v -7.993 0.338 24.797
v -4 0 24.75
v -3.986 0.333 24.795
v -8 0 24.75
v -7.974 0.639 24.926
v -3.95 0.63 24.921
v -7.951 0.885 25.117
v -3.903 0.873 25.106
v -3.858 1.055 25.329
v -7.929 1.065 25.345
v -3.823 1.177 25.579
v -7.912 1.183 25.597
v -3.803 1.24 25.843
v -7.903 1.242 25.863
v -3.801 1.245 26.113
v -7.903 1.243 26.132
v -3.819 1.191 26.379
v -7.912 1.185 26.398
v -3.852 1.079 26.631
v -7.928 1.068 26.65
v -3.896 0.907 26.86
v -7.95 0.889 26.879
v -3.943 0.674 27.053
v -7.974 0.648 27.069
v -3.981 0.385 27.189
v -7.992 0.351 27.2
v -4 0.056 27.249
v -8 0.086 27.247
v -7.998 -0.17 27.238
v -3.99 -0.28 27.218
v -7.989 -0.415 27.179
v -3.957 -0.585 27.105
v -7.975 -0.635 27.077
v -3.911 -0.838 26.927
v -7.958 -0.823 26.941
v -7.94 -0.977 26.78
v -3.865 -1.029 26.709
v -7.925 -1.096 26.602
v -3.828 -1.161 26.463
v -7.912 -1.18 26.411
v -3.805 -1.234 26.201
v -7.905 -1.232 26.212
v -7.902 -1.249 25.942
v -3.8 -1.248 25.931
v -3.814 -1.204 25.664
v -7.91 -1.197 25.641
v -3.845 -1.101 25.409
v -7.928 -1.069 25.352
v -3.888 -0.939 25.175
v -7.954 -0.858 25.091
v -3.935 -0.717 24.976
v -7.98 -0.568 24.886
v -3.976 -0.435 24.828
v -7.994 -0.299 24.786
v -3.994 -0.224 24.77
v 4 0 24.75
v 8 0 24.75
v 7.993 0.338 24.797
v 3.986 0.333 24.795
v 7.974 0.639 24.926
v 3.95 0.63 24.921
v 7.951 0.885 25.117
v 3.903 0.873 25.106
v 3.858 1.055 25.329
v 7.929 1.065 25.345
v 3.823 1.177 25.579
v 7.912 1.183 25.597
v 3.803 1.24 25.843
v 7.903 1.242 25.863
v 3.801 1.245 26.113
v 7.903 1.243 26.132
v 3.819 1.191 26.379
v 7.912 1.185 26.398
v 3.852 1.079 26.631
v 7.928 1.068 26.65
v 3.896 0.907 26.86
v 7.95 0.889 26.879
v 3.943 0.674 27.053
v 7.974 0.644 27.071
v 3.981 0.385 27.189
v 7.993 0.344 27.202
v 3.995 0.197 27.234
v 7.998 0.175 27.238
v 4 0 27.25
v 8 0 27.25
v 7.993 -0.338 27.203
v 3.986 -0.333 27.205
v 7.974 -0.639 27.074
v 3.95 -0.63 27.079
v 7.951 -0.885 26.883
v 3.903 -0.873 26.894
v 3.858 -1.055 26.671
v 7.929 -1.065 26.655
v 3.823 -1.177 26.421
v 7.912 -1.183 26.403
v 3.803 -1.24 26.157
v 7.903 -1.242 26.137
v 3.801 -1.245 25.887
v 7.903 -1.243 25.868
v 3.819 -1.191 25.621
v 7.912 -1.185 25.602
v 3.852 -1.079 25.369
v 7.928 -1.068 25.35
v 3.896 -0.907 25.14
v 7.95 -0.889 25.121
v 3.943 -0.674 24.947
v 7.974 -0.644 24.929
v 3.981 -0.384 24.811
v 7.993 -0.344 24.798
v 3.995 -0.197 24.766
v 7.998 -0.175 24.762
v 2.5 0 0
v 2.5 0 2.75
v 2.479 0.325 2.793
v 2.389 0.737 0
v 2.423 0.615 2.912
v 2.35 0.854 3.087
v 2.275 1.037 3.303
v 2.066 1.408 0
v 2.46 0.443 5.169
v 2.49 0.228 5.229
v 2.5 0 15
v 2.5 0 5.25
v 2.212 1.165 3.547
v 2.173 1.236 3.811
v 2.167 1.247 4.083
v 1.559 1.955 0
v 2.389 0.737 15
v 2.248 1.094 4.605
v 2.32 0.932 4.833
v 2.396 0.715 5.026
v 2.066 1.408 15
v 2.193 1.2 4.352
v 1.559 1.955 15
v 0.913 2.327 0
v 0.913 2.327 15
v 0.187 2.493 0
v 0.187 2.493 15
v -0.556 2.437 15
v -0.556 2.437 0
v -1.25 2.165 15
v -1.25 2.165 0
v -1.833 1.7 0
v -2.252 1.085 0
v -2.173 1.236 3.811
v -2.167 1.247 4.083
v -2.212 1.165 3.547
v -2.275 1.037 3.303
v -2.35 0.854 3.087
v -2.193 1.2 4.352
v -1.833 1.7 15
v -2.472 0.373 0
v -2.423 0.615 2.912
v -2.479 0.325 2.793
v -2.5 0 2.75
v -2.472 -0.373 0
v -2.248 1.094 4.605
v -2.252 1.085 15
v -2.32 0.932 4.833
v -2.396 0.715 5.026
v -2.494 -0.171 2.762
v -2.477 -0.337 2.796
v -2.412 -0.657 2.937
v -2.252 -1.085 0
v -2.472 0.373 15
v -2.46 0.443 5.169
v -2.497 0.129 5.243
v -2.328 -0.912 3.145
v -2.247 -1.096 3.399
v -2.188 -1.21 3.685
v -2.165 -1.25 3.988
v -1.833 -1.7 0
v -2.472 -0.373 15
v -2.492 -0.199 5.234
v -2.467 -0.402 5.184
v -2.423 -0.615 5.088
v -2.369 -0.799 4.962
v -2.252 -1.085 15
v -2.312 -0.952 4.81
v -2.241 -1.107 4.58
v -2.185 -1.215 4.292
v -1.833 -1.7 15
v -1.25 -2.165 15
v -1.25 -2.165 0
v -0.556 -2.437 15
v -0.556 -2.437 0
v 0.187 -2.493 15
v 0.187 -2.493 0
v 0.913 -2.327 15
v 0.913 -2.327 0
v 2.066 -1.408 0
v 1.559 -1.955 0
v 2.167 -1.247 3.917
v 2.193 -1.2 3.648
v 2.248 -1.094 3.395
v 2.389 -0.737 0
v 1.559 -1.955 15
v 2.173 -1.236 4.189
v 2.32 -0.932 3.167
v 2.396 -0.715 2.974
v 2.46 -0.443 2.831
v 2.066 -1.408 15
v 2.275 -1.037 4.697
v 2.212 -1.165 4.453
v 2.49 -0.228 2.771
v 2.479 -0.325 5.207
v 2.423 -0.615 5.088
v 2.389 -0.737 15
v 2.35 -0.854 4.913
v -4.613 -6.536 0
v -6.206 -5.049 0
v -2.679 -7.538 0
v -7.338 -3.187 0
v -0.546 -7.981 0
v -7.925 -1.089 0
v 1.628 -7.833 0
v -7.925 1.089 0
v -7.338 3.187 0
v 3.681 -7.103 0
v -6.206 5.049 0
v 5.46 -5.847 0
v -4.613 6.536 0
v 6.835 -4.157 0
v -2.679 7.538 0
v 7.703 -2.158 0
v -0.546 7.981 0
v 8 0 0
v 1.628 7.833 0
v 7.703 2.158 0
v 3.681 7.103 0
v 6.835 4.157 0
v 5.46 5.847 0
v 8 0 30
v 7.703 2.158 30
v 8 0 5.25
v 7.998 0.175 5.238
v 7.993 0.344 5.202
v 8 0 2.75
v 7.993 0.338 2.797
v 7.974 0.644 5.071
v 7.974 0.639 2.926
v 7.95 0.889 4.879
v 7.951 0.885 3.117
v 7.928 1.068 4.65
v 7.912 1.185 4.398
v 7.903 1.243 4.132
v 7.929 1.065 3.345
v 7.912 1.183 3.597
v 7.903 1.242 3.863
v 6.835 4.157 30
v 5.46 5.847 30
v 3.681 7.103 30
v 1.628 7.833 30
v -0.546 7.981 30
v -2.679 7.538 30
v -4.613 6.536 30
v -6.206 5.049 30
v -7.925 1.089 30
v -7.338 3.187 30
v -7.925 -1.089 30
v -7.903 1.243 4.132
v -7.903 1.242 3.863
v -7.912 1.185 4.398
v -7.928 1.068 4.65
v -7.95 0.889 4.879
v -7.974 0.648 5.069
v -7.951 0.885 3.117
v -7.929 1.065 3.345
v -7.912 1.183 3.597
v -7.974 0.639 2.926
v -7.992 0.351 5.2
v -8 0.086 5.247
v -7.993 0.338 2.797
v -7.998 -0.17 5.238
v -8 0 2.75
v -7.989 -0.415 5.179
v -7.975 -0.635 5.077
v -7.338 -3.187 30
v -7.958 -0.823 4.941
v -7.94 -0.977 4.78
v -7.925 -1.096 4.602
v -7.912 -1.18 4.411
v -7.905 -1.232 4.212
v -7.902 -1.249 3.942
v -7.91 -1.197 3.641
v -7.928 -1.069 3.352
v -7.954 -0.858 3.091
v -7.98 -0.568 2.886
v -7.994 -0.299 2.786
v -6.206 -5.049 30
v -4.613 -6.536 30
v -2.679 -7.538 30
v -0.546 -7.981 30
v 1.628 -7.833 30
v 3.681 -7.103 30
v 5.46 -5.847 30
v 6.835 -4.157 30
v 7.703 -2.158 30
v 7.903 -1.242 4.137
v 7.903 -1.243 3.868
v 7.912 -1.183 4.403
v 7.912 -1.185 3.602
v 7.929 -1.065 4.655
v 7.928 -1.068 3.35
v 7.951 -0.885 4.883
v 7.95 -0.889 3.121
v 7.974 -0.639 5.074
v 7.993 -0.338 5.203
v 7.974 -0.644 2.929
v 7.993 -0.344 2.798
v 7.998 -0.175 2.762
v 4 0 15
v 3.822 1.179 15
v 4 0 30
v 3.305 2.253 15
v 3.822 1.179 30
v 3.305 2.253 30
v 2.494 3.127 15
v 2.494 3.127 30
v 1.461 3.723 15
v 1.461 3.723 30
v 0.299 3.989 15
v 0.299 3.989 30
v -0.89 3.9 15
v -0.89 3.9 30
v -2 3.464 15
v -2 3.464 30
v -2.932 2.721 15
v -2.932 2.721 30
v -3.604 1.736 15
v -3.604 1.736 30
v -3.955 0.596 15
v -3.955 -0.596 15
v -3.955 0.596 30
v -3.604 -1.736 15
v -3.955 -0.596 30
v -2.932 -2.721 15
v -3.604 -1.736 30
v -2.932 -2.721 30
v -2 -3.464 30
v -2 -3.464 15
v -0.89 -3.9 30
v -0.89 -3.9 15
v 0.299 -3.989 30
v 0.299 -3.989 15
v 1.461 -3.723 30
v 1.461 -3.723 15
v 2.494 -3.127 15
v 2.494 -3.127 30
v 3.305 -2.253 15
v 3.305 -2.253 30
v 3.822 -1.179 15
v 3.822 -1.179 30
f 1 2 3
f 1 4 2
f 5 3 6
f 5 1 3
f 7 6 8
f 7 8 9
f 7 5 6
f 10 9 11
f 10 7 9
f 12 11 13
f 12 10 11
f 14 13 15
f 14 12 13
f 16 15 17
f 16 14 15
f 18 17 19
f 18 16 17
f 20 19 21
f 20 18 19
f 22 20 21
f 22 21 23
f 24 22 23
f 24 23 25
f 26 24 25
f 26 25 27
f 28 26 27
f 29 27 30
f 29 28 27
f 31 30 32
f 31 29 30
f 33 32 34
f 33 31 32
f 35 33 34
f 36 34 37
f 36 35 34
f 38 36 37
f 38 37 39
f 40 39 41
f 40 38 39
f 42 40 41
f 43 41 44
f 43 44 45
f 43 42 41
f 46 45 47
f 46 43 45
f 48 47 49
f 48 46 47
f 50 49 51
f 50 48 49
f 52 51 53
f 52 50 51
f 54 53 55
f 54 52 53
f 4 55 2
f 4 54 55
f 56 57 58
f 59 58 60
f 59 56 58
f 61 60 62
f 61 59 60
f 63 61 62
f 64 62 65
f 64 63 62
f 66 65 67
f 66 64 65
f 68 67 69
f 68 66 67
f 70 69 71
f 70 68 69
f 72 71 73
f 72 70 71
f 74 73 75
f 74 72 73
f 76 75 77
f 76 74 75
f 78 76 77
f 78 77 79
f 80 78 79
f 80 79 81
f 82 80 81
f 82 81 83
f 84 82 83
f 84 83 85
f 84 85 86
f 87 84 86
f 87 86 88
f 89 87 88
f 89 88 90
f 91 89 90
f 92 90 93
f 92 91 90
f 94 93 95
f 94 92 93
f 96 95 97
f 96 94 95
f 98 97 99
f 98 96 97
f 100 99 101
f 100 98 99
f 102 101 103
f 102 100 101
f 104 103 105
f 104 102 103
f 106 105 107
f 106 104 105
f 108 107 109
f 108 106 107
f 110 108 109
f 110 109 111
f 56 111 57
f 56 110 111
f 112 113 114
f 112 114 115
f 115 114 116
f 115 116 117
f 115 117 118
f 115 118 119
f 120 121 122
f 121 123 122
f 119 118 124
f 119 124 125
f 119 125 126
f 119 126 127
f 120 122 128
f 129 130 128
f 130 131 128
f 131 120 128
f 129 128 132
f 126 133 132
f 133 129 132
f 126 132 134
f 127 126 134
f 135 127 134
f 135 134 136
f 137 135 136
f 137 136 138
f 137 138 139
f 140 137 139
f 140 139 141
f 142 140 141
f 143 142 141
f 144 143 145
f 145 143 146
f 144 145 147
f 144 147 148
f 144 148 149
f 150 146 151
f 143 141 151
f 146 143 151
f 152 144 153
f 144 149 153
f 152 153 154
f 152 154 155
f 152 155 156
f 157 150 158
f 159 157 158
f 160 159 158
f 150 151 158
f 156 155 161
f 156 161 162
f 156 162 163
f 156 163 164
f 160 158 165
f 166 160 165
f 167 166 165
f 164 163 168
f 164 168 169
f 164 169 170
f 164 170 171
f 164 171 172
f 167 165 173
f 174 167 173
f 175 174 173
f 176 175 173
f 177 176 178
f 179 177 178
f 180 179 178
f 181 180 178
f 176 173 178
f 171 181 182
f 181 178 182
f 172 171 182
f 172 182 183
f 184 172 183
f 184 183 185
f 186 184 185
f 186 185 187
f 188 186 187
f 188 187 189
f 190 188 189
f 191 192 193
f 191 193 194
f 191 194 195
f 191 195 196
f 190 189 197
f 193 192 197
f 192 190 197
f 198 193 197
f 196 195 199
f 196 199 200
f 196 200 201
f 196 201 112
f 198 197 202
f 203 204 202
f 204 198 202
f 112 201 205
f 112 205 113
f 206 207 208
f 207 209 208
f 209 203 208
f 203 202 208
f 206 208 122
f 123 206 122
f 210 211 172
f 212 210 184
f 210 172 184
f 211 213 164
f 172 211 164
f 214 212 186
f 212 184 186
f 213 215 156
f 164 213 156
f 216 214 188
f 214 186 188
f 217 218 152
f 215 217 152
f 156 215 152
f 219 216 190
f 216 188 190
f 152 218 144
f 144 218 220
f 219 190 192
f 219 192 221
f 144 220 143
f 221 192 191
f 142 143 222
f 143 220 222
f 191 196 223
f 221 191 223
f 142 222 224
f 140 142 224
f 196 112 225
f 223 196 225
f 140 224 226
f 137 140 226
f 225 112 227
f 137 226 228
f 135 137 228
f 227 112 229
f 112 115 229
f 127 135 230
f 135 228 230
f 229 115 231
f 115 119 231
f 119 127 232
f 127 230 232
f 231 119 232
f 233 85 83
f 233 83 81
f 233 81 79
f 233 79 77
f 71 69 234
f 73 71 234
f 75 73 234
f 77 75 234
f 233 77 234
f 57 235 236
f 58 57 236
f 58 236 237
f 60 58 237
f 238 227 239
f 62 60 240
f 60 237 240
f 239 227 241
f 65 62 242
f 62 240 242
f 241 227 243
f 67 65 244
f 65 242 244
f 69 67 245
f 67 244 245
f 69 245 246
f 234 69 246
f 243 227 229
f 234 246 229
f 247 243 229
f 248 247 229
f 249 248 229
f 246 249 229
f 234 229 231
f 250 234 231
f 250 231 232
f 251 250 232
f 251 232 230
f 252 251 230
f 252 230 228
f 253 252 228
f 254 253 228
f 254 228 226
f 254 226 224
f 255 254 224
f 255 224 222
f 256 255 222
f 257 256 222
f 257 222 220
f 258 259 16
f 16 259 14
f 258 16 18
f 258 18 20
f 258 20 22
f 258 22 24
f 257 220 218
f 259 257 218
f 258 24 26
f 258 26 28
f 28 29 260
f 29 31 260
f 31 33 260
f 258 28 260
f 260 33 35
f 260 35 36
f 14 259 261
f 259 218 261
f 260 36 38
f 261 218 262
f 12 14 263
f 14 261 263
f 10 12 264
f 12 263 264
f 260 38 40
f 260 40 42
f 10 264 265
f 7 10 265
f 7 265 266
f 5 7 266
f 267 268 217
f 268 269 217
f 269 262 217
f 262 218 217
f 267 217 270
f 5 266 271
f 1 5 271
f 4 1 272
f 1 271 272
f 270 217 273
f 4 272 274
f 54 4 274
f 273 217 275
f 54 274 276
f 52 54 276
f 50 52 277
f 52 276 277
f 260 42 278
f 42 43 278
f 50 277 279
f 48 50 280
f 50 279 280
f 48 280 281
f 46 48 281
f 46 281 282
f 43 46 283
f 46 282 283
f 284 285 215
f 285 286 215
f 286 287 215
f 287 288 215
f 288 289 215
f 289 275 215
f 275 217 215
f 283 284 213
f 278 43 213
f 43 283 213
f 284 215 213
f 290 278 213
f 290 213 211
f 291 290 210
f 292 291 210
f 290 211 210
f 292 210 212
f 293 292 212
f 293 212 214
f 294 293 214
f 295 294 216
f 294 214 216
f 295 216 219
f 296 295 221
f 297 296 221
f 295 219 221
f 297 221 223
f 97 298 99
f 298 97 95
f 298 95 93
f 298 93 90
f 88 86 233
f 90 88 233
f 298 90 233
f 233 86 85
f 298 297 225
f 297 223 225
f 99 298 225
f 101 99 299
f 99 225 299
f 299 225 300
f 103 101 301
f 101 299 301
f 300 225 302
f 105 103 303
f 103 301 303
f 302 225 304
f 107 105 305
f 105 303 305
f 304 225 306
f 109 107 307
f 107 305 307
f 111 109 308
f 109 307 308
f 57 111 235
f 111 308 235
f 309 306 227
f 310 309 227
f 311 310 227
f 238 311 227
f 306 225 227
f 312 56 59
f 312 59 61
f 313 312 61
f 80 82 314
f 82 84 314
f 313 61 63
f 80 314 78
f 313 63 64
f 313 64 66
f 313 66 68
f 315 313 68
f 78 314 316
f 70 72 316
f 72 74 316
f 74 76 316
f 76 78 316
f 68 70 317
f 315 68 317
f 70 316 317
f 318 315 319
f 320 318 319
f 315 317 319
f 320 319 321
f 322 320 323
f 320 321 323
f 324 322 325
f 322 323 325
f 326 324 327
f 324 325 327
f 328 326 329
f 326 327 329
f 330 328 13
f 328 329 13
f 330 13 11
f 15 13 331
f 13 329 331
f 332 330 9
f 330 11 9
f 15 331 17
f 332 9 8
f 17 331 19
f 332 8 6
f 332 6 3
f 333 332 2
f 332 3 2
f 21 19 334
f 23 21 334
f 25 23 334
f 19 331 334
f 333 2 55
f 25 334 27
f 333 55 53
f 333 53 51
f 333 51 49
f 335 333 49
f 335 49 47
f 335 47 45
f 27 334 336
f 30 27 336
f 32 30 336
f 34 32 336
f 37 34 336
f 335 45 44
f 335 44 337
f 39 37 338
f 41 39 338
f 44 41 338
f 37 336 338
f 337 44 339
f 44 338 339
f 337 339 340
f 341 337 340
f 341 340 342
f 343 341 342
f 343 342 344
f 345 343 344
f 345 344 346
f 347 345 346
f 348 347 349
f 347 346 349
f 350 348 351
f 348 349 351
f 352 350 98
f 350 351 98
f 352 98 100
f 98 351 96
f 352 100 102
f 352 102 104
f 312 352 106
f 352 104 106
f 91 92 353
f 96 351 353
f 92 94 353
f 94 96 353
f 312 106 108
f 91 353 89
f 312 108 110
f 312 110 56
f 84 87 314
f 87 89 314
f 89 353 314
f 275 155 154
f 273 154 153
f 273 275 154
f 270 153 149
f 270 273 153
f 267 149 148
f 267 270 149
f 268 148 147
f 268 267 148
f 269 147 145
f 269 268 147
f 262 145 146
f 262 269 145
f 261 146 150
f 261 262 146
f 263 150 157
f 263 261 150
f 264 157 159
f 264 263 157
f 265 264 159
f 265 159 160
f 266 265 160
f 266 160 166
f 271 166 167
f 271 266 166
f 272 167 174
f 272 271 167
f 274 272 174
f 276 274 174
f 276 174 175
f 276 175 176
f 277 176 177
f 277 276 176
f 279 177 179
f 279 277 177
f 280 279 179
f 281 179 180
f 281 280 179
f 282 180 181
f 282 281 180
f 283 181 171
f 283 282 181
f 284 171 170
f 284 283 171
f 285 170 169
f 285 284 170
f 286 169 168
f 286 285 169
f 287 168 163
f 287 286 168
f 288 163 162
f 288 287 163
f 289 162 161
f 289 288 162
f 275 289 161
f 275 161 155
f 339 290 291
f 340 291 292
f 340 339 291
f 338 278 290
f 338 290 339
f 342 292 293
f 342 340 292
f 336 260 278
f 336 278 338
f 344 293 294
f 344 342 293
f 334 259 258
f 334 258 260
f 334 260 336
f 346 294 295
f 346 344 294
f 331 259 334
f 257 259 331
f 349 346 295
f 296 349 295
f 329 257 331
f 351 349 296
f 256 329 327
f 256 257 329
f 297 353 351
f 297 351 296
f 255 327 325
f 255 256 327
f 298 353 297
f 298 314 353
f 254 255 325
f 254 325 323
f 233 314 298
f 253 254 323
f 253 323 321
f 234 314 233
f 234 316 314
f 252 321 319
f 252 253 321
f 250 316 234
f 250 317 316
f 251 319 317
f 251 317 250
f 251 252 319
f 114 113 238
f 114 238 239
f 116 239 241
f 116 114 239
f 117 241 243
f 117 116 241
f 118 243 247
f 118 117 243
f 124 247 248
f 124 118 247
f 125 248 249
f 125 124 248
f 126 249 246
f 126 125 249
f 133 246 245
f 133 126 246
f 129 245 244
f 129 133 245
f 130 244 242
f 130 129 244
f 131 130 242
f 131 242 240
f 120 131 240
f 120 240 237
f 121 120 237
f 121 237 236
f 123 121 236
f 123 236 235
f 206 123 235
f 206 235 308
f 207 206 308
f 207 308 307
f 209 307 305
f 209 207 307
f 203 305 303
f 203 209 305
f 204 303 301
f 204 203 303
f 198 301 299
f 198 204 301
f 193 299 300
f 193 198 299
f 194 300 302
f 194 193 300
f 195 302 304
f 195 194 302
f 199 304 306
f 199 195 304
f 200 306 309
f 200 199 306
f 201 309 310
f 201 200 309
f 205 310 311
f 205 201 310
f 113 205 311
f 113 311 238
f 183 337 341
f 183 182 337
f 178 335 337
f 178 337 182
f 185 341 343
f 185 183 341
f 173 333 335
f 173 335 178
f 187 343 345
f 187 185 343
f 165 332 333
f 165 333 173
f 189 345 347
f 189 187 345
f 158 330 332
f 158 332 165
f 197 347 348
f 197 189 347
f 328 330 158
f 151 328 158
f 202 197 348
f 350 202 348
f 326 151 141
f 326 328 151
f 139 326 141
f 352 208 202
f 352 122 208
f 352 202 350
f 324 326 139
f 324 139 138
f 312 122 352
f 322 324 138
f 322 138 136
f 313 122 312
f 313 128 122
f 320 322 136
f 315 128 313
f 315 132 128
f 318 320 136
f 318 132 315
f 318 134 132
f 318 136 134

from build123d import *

# Parameters (mm, degrees)
SCHIZZO1_R                    = 8
ESTRUSIONE_ESTRUSIONE1_DEPTH  = 30
SCHIZZO2_R                    = 2.5
TAGLIO_ESTRUSIONE1_DEPTH      = 33.062439084
SCHIZZO3_R                    = 4
TAGLIO_ESTRUSIONE2_DEPTH      = 15
TAGLIO_ESTRUSIONE3_DEPTH      = 33.062439084
TAGLIO_ESTRUSIONE3_DEPTH_BACK = 33.062439084
SCHIZZO4_R                    = 1.25


with BuildPart() as part:
    # Schizzo1 → Estrusione-Estrusione1 (new body)
    with BuildSketch(Plane.XY):
        Circle(SCHIZZO1_R)
    extrude(amount=ESTRUSIONE_ESTRUSIONE1_DEPTH)

    # Schizzo2 → Taglio-Estrusione1 (cut, through all)
    with BuildSketch(Plane.XY.offset(30)):
        Circle(SCHIZZO2_R)
    extrude(amount=-TAGLIO_ESTRUSIONE1_DEPTH, mode=Mode.SUBTRACT)

    # Schizzo3 → Taglio-Estrusione2 (cut)
    with BuildSketch(Plane.XY.offset(30)):
        Circle(SCHIZZO3_R)
    extrude(amount=-TAGLIO_ESTRUSIONE2_DEPTH, mode=Mode.SUBTRACT)

    # Schizzo4 → Taglio-Estrusione3 (cut, two sides: drawn at the far end of the back side and taken through both)
    with BuildSketch(Plane(origin=(0, 0, 0), x_dir=(0, 0, -1), z_dir=(1, 0, 0)).offset(-TAGLIO_ESTRUSIONE3_DEPTH_BACK)):
        with Locations((-26, 0)):
            Circle(SCHIZZO4_R)
        with Locations((-4, 0)):
            Circle(SCHIZZO4_R)
    extrude(amount=TAGLIO_ESTRUSIONE3_DEPTH + TAGLIO_ESTRUSIONE3_DEPTH_BACK, mode=Mode.SUBTRACT)


solid = part.part
